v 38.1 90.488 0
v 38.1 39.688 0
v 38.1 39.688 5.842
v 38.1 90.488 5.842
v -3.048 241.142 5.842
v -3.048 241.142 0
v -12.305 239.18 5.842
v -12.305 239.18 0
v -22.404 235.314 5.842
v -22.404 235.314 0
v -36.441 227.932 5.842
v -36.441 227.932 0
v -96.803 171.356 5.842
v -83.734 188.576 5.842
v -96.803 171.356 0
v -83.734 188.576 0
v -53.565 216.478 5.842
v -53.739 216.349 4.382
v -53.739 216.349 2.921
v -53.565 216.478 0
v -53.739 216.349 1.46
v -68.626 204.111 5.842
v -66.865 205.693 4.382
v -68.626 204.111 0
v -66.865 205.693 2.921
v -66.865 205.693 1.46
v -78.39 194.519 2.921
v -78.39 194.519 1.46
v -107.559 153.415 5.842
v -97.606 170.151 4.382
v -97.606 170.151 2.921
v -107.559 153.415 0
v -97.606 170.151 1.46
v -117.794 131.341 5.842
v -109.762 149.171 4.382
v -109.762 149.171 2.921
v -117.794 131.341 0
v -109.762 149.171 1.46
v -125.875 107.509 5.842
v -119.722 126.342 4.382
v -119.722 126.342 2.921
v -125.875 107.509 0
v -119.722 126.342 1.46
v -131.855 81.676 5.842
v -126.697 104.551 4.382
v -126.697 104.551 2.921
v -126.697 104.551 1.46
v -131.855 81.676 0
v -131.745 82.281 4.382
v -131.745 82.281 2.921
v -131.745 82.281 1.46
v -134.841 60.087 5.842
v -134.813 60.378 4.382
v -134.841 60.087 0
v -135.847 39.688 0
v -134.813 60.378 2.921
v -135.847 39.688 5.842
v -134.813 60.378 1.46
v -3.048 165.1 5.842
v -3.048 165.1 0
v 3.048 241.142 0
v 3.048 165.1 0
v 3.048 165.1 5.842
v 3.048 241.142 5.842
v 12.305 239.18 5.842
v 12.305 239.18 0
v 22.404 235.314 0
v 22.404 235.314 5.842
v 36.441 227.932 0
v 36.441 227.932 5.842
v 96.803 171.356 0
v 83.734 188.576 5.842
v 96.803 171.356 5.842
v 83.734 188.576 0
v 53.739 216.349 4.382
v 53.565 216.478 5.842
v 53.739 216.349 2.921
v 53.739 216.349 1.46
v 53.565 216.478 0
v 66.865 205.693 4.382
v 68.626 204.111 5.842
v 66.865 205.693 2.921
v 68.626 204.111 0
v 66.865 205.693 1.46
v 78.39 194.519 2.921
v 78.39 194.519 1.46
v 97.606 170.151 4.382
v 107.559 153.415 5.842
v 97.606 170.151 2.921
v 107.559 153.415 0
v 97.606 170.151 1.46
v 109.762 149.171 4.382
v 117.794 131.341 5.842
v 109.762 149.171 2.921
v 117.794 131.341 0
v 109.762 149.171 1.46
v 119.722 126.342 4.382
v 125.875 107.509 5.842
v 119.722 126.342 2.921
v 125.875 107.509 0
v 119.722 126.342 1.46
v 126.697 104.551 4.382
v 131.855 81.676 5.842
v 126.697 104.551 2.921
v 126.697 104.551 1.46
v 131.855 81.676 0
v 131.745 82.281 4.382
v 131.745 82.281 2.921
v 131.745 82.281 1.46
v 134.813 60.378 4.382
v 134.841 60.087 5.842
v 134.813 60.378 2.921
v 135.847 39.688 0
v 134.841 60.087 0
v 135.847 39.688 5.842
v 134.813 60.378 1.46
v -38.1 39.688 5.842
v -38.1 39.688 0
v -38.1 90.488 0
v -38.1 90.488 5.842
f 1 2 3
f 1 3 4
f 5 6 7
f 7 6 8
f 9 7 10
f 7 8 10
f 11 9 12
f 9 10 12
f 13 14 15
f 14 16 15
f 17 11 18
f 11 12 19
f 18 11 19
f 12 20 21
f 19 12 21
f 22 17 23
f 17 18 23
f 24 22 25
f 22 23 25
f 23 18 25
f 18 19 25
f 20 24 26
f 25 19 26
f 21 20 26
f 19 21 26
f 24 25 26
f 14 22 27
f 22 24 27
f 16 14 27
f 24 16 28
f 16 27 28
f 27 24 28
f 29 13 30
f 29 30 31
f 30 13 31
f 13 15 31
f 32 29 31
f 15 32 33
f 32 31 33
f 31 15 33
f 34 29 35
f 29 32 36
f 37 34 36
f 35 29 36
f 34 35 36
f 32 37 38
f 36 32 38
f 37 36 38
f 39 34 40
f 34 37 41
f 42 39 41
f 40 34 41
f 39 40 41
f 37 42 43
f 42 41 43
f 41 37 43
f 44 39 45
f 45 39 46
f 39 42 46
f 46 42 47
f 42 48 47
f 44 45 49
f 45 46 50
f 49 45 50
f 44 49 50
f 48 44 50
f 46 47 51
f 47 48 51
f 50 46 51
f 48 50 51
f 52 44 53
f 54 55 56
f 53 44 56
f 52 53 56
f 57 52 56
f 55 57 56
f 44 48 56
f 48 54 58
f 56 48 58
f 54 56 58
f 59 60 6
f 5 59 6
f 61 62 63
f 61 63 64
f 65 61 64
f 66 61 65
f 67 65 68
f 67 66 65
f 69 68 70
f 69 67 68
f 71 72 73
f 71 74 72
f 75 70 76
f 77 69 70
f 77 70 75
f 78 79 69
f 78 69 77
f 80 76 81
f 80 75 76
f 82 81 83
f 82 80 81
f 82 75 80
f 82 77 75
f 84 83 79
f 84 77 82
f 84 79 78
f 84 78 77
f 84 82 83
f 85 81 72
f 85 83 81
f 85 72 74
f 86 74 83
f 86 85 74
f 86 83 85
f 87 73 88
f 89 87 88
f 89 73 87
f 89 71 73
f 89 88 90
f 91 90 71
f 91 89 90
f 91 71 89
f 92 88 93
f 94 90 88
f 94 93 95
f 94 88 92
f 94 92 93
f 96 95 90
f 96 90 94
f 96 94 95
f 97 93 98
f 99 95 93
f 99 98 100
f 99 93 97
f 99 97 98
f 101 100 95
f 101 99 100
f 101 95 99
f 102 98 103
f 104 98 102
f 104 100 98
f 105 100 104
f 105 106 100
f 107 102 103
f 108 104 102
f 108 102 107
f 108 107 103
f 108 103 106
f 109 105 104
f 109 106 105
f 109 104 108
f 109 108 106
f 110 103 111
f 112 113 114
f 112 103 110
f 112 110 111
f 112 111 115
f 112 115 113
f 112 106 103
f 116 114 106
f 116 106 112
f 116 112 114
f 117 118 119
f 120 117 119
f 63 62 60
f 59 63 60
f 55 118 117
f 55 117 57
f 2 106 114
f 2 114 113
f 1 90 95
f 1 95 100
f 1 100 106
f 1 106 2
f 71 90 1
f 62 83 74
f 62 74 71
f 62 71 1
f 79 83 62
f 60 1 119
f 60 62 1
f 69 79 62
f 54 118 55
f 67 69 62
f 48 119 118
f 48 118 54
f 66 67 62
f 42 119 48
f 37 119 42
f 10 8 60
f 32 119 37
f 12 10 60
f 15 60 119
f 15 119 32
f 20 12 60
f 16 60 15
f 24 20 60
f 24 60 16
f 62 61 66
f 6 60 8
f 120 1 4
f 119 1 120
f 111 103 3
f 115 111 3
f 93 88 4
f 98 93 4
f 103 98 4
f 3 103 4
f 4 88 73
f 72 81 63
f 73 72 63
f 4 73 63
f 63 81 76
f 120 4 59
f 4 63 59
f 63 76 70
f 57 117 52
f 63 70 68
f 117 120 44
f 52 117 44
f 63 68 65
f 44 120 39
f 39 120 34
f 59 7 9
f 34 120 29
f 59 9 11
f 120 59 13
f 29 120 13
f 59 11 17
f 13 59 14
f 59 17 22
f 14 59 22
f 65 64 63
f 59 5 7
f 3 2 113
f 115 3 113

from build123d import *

# Parameters (mm, degrees)
BOSS_EXTRUDE1_DEPTH = 5.842
SKETCH4_W           = 38.1
SKETCH4_H           = 50.8
SKETCH4_W_2         = 3.048
SKETCH4_H_2         = 76.2
CUT_EXTRUDE2_DEPTH  = 277.973416612


with BuildPart() as part:
    # Sketch3 → Boss-Extrude1 (new body)
    with BuildSketch(Plane.XY):
        with BuildLine():
            Line((0, 241.3), (0, 39.6875))
            Line((0, 39.6875), (135.847173209, 39.6875))
            add(Edge.make_bspline(
                [(0, 241.3), (14.73835438, 241.3), (59.624010151, 216.373546587), (96.769766419, 175.903175742), (127.183964056, 115.738105555), (135.847173209, 66.091328973), (135.847173209, 39.6875)],
                knots=[0, 0, 0, 0, 0.227729534, 0.472592903, 0.661218042, 1, 1, 1, 1], degree=3))
        make_face()
    extrude(amount=BOSS_EXTRUDE1_DEPTH)

    # Sketch4 → Cut-Extrude2 (cut, through all)
    with BuildSketch(Plane.XY):
        with Locations((19.05, 65.0875)):
            Rectangle(SKETCH4_W, SKETCH4_H)
        with Locations((1.524, 203.2)):
            Rectangle(SKETCH4_W_2, SKETCH4_H_2)
    extrude(amount=CUT_EXTRUDE2_DEPTH, mode=Mode.SUBTRACT)

    # Mirror2: part across plane


with BuildPart() as part_1:
    add(part.part)
    add(part.part.mirror(Plane(origin=(0, 0, 0), x_dir=(0, 0, 1), z_dir=(1, 0, 0))))


solid = part_1.part
